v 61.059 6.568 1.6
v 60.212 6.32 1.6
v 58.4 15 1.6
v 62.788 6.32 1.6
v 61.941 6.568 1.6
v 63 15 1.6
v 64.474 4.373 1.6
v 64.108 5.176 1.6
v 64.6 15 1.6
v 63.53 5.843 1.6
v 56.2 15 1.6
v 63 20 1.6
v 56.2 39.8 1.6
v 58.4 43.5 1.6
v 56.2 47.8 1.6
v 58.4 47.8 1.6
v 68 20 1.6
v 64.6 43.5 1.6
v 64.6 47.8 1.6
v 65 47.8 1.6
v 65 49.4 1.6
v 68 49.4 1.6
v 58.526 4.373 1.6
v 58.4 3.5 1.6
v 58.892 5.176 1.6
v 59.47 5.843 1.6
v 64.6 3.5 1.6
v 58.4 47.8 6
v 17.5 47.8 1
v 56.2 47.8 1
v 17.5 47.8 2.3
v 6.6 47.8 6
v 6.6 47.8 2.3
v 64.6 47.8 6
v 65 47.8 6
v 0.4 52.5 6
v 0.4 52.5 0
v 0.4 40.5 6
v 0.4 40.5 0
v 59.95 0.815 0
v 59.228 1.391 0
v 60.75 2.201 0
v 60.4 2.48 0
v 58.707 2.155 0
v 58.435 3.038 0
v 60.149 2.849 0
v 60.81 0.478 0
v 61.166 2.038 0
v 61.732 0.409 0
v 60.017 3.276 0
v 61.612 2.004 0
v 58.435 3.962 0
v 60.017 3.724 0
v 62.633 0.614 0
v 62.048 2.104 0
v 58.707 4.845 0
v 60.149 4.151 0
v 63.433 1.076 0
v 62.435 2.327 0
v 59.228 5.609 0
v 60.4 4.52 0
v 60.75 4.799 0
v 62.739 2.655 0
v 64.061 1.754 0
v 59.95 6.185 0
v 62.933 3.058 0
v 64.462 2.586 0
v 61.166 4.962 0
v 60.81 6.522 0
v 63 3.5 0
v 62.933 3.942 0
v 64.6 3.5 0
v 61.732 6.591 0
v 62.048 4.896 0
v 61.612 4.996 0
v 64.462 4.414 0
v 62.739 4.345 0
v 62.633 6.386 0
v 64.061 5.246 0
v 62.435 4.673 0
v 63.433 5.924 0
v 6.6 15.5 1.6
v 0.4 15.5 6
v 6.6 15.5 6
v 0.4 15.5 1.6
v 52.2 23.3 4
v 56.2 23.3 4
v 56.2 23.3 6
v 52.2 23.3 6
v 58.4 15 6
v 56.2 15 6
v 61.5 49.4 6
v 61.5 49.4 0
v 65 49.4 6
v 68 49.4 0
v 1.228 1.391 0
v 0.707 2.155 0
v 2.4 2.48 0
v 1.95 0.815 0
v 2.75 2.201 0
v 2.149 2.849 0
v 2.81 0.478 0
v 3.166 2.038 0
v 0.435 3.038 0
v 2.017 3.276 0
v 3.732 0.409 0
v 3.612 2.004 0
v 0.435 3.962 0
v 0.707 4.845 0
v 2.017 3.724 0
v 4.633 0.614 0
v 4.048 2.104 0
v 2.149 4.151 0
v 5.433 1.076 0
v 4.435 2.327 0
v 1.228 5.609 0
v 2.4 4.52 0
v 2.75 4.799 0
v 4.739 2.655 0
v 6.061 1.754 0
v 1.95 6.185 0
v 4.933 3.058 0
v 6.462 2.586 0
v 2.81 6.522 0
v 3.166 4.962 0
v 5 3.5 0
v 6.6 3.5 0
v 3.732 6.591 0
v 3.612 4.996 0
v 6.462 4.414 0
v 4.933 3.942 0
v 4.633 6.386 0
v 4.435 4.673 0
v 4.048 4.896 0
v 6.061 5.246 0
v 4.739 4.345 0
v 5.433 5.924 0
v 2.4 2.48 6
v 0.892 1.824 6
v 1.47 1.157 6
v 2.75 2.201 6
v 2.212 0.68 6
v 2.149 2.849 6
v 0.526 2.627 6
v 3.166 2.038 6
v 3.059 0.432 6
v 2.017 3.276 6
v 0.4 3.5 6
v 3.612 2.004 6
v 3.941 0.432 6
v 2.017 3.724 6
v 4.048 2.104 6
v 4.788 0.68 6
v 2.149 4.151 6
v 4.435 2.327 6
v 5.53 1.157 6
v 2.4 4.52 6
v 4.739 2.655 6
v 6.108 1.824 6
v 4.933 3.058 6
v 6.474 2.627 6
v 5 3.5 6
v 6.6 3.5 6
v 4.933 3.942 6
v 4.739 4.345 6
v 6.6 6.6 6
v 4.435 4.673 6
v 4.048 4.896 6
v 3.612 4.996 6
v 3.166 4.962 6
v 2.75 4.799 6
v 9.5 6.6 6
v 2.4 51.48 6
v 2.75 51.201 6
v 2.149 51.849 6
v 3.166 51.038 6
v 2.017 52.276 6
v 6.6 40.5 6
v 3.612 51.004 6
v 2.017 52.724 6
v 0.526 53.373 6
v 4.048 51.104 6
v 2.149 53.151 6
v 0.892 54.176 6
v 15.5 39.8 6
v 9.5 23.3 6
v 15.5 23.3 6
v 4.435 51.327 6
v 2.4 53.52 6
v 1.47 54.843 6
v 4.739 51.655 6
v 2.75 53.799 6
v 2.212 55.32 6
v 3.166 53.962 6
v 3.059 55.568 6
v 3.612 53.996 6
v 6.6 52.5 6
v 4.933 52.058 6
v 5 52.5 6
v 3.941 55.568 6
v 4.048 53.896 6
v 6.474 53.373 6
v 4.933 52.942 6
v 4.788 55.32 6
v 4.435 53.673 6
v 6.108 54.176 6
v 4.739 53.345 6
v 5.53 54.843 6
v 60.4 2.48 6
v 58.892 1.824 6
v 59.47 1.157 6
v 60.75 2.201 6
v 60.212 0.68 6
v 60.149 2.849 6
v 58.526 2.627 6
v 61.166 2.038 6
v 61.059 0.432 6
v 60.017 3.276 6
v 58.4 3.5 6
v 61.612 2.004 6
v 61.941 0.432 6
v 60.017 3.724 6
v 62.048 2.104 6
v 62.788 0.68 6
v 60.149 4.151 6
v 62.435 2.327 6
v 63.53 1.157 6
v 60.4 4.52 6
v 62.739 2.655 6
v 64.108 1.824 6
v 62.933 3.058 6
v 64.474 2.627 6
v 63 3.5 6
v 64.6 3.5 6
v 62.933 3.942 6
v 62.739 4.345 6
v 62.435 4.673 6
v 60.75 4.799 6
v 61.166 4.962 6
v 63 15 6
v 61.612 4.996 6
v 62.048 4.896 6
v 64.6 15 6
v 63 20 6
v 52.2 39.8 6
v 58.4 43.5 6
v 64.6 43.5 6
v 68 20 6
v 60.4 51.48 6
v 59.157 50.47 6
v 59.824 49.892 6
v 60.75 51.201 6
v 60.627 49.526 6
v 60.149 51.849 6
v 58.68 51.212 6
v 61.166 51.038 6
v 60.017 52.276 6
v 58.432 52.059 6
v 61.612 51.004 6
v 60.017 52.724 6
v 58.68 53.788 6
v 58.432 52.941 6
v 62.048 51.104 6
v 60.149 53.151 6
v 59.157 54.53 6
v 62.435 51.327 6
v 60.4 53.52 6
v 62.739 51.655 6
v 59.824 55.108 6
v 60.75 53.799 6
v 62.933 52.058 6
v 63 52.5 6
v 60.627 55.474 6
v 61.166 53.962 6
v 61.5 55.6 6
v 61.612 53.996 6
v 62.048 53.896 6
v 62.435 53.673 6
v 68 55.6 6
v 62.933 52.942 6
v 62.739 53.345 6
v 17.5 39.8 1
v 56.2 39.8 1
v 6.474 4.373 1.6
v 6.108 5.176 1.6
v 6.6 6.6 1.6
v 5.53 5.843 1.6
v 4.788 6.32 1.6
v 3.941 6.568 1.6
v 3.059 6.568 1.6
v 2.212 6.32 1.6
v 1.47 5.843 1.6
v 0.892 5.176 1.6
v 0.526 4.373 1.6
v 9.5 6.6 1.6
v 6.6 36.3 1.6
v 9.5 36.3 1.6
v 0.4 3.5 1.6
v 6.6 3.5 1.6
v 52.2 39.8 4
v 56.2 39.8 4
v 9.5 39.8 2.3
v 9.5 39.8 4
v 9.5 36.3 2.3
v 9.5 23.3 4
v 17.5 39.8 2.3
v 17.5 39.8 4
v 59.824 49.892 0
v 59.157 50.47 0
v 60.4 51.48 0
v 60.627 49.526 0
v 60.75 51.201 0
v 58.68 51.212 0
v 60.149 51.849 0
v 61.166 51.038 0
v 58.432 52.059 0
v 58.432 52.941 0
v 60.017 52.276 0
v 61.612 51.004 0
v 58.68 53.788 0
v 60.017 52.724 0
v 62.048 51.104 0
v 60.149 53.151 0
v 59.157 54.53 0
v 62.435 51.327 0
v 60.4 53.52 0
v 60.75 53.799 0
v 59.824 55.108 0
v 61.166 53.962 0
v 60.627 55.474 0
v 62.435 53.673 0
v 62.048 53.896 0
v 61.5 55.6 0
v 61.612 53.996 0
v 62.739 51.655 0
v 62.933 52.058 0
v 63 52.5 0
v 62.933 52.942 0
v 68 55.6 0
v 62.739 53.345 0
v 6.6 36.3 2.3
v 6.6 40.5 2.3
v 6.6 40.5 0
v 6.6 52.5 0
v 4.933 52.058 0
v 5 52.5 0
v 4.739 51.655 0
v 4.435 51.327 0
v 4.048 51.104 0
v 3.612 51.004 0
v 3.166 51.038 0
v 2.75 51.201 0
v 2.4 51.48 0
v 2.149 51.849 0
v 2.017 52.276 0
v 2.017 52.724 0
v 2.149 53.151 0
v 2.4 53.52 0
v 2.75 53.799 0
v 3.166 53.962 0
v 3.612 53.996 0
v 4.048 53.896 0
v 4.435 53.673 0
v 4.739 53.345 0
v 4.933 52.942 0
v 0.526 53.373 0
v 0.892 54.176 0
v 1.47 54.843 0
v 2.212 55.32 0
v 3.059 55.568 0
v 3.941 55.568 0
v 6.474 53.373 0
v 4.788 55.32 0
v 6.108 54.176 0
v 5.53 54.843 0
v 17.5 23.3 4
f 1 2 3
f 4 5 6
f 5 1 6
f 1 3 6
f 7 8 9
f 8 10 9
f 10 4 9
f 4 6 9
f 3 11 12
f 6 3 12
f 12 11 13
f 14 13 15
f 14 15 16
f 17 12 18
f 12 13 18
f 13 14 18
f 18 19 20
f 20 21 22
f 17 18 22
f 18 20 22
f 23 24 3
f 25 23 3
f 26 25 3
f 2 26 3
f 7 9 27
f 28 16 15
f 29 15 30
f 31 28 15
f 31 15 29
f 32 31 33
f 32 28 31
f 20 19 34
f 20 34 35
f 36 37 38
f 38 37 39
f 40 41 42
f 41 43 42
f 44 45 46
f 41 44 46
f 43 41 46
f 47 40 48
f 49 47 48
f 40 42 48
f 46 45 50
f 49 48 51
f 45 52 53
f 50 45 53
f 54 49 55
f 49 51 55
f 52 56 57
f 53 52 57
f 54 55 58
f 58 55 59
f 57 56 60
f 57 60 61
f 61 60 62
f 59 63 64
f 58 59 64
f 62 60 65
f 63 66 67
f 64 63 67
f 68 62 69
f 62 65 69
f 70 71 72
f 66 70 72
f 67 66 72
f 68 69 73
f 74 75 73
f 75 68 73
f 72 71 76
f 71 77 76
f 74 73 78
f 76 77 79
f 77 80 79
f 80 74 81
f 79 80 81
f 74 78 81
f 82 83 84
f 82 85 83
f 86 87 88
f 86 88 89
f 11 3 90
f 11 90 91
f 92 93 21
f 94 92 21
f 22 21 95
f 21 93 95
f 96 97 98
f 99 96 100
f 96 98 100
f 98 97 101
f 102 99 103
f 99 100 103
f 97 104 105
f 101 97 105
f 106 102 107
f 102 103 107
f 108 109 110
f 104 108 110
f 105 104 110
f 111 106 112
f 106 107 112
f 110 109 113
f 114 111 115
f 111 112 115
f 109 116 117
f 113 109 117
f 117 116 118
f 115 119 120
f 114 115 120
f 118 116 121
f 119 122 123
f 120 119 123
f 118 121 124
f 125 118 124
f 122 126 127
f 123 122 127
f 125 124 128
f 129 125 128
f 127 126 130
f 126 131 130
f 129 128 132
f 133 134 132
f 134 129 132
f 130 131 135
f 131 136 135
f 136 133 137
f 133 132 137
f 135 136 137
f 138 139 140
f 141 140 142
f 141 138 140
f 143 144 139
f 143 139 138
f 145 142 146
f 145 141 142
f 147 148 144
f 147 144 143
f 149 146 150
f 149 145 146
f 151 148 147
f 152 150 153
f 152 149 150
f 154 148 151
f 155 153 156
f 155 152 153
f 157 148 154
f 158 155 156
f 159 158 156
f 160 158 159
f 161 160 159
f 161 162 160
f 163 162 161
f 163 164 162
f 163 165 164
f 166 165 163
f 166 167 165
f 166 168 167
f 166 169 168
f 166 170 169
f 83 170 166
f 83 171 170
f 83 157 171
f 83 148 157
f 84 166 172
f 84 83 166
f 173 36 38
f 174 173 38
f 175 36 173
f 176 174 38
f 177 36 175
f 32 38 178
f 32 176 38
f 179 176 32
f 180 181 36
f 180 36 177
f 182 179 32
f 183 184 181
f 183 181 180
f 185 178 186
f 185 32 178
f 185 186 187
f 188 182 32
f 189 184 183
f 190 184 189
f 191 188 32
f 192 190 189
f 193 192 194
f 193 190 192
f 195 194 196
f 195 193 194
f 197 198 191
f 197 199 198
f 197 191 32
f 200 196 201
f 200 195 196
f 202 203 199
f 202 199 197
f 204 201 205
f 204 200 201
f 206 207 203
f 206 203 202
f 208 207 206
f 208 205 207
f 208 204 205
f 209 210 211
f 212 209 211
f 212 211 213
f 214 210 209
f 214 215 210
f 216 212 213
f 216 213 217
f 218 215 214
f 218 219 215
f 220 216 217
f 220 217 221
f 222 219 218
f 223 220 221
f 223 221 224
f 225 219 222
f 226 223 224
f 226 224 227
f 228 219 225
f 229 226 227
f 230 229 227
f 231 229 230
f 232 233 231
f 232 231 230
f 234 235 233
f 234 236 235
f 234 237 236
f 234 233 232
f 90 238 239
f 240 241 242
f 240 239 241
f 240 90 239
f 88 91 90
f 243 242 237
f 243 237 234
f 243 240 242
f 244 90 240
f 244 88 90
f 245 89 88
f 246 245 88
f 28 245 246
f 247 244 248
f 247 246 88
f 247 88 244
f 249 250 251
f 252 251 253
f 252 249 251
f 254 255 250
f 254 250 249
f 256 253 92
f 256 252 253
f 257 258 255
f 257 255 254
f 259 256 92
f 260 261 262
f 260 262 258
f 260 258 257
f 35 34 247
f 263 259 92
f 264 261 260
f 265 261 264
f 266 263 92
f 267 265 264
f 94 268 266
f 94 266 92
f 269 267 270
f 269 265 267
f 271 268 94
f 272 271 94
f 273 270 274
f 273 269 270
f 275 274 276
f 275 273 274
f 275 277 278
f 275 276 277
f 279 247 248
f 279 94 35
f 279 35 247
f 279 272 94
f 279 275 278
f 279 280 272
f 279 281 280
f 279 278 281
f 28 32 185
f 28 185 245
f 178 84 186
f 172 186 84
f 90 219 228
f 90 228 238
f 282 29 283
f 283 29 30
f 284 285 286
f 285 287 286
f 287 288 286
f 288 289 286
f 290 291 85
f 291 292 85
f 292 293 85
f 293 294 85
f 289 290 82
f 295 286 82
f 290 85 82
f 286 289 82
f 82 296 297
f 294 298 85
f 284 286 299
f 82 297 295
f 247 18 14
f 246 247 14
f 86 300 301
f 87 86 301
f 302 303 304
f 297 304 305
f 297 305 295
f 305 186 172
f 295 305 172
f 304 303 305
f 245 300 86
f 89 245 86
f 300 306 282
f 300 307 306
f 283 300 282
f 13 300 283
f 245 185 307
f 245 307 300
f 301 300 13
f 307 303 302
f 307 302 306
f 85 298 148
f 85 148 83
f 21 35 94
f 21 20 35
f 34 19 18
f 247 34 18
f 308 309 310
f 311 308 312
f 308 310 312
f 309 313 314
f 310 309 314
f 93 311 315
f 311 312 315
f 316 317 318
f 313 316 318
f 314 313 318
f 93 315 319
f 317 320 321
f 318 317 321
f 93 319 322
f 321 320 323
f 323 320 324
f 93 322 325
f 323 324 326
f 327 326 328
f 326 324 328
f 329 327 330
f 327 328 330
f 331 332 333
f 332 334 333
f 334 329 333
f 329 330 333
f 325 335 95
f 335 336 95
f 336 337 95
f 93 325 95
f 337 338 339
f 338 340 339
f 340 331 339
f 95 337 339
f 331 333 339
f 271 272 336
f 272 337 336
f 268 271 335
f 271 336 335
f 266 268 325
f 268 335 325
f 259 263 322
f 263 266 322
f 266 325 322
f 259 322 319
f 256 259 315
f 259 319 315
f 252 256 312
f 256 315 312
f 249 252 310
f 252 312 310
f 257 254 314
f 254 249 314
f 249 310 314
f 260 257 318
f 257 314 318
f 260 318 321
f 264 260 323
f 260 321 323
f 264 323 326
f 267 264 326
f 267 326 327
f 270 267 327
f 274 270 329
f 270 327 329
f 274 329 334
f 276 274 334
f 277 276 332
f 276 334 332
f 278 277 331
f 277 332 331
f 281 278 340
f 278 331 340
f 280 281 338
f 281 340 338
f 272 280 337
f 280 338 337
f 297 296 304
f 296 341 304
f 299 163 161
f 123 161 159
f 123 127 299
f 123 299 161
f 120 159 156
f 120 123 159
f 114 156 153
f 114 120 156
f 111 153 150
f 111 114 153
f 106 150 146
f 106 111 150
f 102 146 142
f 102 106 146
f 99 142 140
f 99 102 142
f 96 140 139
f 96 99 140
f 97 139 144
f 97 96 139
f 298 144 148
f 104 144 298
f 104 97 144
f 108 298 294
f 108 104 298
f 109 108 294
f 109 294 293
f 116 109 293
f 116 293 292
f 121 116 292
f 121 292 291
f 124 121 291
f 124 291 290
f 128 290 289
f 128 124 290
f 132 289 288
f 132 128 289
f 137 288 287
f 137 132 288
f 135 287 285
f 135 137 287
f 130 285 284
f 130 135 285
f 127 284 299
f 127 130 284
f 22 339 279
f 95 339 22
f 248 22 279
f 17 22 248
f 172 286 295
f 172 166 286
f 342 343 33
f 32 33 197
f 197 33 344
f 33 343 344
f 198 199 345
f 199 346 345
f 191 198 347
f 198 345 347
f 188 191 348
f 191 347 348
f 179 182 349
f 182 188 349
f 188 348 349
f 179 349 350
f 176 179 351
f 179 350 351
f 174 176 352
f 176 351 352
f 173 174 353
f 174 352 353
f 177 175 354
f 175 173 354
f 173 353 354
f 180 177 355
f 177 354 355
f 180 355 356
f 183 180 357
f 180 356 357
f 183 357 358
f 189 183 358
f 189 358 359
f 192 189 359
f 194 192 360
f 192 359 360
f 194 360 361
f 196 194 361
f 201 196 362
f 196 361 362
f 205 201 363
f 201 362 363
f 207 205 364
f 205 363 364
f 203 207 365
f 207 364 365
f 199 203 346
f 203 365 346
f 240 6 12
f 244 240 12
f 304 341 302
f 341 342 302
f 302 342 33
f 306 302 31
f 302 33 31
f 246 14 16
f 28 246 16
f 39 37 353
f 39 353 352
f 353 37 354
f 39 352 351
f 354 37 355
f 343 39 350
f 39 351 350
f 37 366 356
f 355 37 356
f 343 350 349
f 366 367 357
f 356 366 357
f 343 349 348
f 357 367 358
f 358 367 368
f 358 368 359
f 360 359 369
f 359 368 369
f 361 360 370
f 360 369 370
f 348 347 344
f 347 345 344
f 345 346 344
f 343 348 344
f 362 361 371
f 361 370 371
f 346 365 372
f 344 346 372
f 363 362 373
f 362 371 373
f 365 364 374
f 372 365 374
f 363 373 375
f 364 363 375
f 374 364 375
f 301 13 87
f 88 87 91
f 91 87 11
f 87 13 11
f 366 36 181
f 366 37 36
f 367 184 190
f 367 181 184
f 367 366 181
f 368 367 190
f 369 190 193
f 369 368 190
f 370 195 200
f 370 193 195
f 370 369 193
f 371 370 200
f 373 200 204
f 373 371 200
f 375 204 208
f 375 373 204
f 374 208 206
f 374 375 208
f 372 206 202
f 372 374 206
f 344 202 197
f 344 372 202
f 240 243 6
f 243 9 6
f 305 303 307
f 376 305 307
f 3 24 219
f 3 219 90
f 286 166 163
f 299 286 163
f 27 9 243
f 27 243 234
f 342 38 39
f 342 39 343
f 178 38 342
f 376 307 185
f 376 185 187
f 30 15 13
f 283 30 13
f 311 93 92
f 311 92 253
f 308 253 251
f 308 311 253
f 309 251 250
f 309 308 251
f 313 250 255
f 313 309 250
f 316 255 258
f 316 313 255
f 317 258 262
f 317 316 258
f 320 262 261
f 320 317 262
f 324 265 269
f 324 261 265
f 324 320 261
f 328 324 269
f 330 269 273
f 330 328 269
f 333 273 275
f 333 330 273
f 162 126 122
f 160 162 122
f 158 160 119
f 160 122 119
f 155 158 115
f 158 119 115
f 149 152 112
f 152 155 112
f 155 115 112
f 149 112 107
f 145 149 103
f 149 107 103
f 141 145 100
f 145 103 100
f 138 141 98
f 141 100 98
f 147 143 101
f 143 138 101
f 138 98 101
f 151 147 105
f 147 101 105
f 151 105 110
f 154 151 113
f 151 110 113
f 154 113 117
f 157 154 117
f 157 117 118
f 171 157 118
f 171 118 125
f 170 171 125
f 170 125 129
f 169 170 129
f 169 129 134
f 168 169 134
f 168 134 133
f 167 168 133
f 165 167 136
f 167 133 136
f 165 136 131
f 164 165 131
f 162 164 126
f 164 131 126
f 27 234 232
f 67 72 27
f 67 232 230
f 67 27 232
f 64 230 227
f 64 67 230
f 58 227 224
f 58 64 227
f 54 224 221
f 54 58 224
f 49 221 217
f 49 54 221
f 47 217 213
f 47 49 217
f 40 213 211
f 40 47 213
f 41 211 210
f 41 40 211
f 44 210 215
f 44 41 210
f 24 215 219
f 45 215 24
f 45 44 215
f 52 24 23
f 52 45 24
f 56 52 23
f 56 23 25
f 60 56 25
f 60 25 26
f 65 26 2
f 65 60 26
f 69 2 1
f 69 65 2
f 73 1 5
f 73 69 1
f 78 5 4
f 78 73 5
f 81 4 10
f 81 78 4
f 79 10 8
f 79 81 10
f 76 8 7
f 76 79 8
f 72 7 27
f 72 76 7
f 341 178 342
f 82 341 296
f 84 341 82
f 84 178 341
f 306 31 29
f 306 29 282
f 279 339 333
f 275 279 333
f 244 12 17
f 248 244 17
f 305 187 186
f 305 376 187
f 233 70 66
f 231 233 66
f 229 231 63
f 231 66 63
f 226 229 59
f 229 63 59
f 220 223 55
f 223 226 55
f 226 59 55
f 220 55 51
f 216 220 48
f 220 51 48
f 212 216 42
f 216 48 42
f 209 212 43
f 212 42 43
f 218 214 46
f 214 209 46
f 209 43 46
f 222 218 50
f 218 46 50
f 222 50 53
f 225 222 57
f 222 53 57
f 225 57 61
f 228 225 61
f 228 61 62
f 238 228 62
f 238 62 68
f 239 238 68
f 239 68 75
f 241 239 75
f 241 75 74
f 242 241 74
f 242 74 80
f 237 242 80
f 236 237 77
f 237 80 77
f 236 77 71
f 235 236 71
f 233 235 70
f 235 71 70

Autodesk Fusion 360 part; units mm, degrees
sketch "Skizze1" plane through (0, 0, 0) normal (0, 0, 1) x (1, 0, 0)
  line L0 (0, 0) -> (65, 0)
  line L1 (65, 0) -> (65, 56)
  line L2 (65, 56) -> (0, 56)
  line L3 (0, 56) -> (0, 0)
  circle A0 centre (61.5, 52.5) radius 1.5
  circle A1 centre (3.5, 52.5) radius 1.5
  circle A2 centre (3.5, 3.5) radius 1.5
  circle A3 centre (61.5, 3.5) radius 1.5
  line L4 (3.5, 3.5) -> (61.5, 3.5) construction
  line L5 (61.5, 3.5) -> (61.5, 52.5) construction
  line L6 (61.5, 52.5) -> (3.5, 52.5) construction
  line L7 (3.5, 52.5) -> (3.5, 3.5) construction
  line L8 (9.5, 39.8) -> (56.2, 39.8) construction
  line L9 (56.2, 39.8) -> (56.2, 23.3) construction
  line L10 (56.2, 23.3) -> (9.5, 23.3) construction
  line L11 (9.5, 23.3) -> (9.5, 39.8) construction
  line L12 (18.5, 39.8) -> (18.5, 35.3) construction
  line L13 (18.5, 35.3) -> (9.5, 35.3) construction
  line L14 (19.5, 25) -> (33.5, 25) construction
  line L15 (33.5, 25) -> (33.5, 39) construction
  line L16 (33.5, 39) -> (19.5, 39) construction
  line L17 (19.5, 39) -> (19.5, 25) construction
  line L18 (7, 49.3) -> (17.5, 49.3) construction
  line L19 (17.5, 49.3) -> (17.5, 36.3) construction
  line L20 (17.5, 36.3) -> (7, 36.3) construction
  line L21 (7, 36.3) -> (7, 49.3) construction
  line L22 (52.2, 39.8) -> (52.2, 23.3) construction
  line L23 (17.5, 23.3) -> (17.5, 36.3) construction
  circle A4 centre (3.5, 52.5) radius 3.1
  circle A5 centre (61.5, 52.5) radius 3.1
  circle A6 centre (3.5, 3.5) radius 3.1
  circle A7 centre (61.5, 3.5) radius 3.1
  line L24 (6.6, 52.5) -> (0.4, 52.5) construction
  line L25 (0.4, 52.5) -> (0.4, 40.5)
  line L26 (0.4, 40.5) -> (6.6, 40.5)
  line L27 (6.6, 40.5) -> (6.6, 52.5)
  line L28 (61.5, 49.4) -> (68, 49.4)
  line L29 (68, 49.4) -> (68, 55.6)
  line L30 (68, 55.6) -> (61.5, 55.6)
  line L31 (61.5, 55.6) -> (61.5, 49.4) construction
  dimension "d1" = 65
  dimension "d2" = 56
  dimension "d3" = 49
  dimension "d4" = 3.5
  dimension "d5" = 4
  dimension "d6" = 3.5
  dimension "d7" = 3.5
  dimension "d8" = 3
  dimension "d9" = 3
  dimension "d10" = 3
  dimension "d11" = 3
  dimension "d12" = 46.7
  dimension "d13" = 16.5
  dimension "d14" = 4.5
  dimension "d15" = 9
  dimension "d16" = 14
  dimension "d17" = 14
  dimension "d18" = 17
  dimension "d19" = 19.5
  dimension "d20" = 10.5
  dimension "d21" = 13
  dimension "d22" = 6.7
  dimension "d23" = 7
  dimension "d24" = 2
  dimension "d25" = 1
  dimension "d26" = 1
  dimension "d27" = 1
  dimension "d28" = 4
  dimension "d29" = 8
  dimension "d30" = 6.2
  dimension "d31" = 6.2
  dimension "d32" = 6.2
  dimension "d33" = 6.2
  dimension "d36" = 12
  dimension "d37" = 6.5
ref_plane "Arbeitsebene1" through (0, 0, 4) normal (0, 0, 1) x (1, 0, 0)
sketch "Skizze2" plane through (0, 0, 4) normal (0, 0, 1) x (1, 0, 0)
  line L0 (52.2, 39.8) -> (52.2, 23.3)
  line L1 (56.2, 39.8) -> (56.2, 23.3)
  line L2 (56.2, 23.3) -> (9.5, 23.3)
  line L3 (9.5, 39.8) -> (56.2, 39.8)
  line L4 (9.5, 23.3) -> (9.5, 39.8)
  line L5 (17.5, 23.3) -> (17.5, 36.3)
  line L6 (17.5, 49.3) -> (17.5, 36.3)
  line L7 (56.2, 39.8) -> (9.5, 39.8)
  line L8 (9.5, 39.8) -> (9.5, 47.8)
  line L9 (9.5, 47.8) -> (56.2, 47.8)
  line L10 (56.2, 47.8) -> (56.2, 39.8)
  line L11 (56.2, 47.8) -> (68, 47.8)
  line L12 (68, 47.8) -> (68, 15)
  line L13 (68, 15) -> (56.2, 15)
  line L14 (56.2, 15) -> (56.2, 47.8)
  line L15 (0, 0) -> (65, 0)
  line L16 (68, 49.4) -> (68, 55.6)
  line L17 (68, 15) -> (63, 15)
  line L18 (63, 15) -> (63, 20)
  line L19 (63, 20) -> (68, 20)
  line L20 (68, 20) -> (68, 15)
  line L21 (68, 49.4) -> (68, 47.8)
  line L22 (61.5, 49.4) -> (68, 49.4)
  line L23 (65, 0) -> (65, 56)
  line L24 (65, 47.8) -> (65, 49.4)
  line L25 (58.4, 47.8) -> (64.6, 47.8)
  line L26 (64.6, 47.8) -> (64.6, 43.5)
  line L27 (64.6, 43.5) -> (58.4, 43.5)
  line L28 (58.4, 43.5) -> (58.4, 47.8)
  circle A0 centre (61.5, 52.5) radius 3.1
  line L29 (58.4, 15) -> (64.6, 15)
  line L30 (64.6, 15) -> (64.6, 3.5)
  line L31 (64.6, 3.5) -> (58.4, 3.5)
  line L32 (58.4, 3.5) -> (58.4, 15)
  circle A1 centre (61.5, 3.5) radius 3.1
  line L33 (6.6, 40.5) -> (9.5, 40.5)
  line L34 (6.6, 40.5) -> (6.6, 52.5)
  line L35 (9.5, 47.8) -> (6.6, 47.8)
  line L36 (6.6, 3.5) -> (0.4, 3.5)
  line L37 (0.4, 3.5) -> (0.4, 15.5)
  line L38 (0.4, 15.5) -> (6.6, 15.5)
  line L39 (6.6, 15.5) -> (6.6, 3.5)
  circle A2 centre (3.5, 3.5) radius 3.1
  line L40 (3.5, 3.5) -> (61.5, 3.5)
  line L41 (6.6, 40.5) -> (6.6, 15.5)
  line L42 (9.5, 23.3) -> (9.5, 6.6)
  line L43 (6.6, 6.6) -> (9.5, 6.6)
  line L44 (6.6, 36.3) -> (9.5, 36.3)
  dimension "d45" = 8
  dimension "d50" = 15
  dimension "d52" = 20
  dimension "d53" = 5
  dimension "d70" = 9
  dimension "d81" = 12
extrude "Extrusion3" add sketch "Skizze2" along normal blind 2 contours L0 L1 L2 L3 L7 L14 | L2 L3 L4 L5 L6 L7 makes body 1 at (54.8667, 28.8, 4) makes body 2 at (12.1667, 28.8, 4)
chamfer "Fase1" distance 2 angle 45 1 edges at (17.5, 31.55, 6) measured on face at (12.1667, 28.8, 6) on bodies 2
extrude "Extrusion4" add sketch "Skizze2" along normal blind 2 contours L3 L6 L7 L9 L10 L14 | L3 L6 L7 L8 L9 bodies 1 2
extrude "Extrusion5" add sketch "Skizze2" against normal blind 3 contours L3 L6 L7 L9 L10 L14 bodies 1
extrude "Extrusion6" add sketch "Skizze2" along normal blind 2 and the other way blind 2.4 contours L1 L10 L11 L13 L14 L18 L19 L23 L26 L27 L28 L29 | L11 L12 L19 L23 bodies 1
extrude "Extrusion7" add sketch "Skizze1" along normal blind 6 separate body contours L1 A5 L28 L30 | L1 L28 L29 L30 | A5 makes body 3
extrude "Extrusion8" add sketch "Skizze1" along normal blind 6 separate body contours A4 | A4 L25 L26 L27 makes body 4
extrude "Extrusion9" add sketch "Skizze1" along normal blind 6 separate body contours A7 makes body 5
extrude "Extrusion10" add sketch "Skizze1" along normal blind 6 separate body contours A6 makes body 6
extrude "Extrusion11" add sketch "Skizze2" along normal blind 2 and the other way blind 2.4 contours L11 L21 L22 L23 L24 bodies 1 3
extrude "Extrusion12" add sketch "Skizze2" along normal blind 2 and the other way blind 2.4 contours L13 L17 L29 L30 L32 A1 bodies 1 5
extrude "Extrusion13" add sketch "Skizze2" against normal blind 1.7 contours L3 L6 L7 L8 L9 bodies 1
extrude "Extrusion14" add sketch "Skizze2" along normal blind 2 contours L8 L33 L34 L35 bodies 1 4
extrude "Extrusion15" add sketch "Skizze2" against normal blind 1.7 contours L8 L33 L34 L35 bodies 1
extrude "Extrusion16" add sketch "Skizze2" against normal blind 1.7 separate body contours L4 L8 L33 L41 L44 makes body 7
extrude "Extrusion17" add sketch "Skizze2" against normal blind 2.4 contours L4 L39 L41 L42 L43 L44 | L37 L38 L39 A2 bodies 6 1 7
extrude "Extrusion18" add sketch "Skizze2" along normal blind 2 contours L4 L8 L33 L41 L44 | L4 L39 L41 L42 L43 L44 | L37 L38 L39 A2 bodies 6
equation "d6 = d4"
equation "d7 = d4"
equation "d9 = d8"
equation "d10 = d8"
equation "d11 = d8"
